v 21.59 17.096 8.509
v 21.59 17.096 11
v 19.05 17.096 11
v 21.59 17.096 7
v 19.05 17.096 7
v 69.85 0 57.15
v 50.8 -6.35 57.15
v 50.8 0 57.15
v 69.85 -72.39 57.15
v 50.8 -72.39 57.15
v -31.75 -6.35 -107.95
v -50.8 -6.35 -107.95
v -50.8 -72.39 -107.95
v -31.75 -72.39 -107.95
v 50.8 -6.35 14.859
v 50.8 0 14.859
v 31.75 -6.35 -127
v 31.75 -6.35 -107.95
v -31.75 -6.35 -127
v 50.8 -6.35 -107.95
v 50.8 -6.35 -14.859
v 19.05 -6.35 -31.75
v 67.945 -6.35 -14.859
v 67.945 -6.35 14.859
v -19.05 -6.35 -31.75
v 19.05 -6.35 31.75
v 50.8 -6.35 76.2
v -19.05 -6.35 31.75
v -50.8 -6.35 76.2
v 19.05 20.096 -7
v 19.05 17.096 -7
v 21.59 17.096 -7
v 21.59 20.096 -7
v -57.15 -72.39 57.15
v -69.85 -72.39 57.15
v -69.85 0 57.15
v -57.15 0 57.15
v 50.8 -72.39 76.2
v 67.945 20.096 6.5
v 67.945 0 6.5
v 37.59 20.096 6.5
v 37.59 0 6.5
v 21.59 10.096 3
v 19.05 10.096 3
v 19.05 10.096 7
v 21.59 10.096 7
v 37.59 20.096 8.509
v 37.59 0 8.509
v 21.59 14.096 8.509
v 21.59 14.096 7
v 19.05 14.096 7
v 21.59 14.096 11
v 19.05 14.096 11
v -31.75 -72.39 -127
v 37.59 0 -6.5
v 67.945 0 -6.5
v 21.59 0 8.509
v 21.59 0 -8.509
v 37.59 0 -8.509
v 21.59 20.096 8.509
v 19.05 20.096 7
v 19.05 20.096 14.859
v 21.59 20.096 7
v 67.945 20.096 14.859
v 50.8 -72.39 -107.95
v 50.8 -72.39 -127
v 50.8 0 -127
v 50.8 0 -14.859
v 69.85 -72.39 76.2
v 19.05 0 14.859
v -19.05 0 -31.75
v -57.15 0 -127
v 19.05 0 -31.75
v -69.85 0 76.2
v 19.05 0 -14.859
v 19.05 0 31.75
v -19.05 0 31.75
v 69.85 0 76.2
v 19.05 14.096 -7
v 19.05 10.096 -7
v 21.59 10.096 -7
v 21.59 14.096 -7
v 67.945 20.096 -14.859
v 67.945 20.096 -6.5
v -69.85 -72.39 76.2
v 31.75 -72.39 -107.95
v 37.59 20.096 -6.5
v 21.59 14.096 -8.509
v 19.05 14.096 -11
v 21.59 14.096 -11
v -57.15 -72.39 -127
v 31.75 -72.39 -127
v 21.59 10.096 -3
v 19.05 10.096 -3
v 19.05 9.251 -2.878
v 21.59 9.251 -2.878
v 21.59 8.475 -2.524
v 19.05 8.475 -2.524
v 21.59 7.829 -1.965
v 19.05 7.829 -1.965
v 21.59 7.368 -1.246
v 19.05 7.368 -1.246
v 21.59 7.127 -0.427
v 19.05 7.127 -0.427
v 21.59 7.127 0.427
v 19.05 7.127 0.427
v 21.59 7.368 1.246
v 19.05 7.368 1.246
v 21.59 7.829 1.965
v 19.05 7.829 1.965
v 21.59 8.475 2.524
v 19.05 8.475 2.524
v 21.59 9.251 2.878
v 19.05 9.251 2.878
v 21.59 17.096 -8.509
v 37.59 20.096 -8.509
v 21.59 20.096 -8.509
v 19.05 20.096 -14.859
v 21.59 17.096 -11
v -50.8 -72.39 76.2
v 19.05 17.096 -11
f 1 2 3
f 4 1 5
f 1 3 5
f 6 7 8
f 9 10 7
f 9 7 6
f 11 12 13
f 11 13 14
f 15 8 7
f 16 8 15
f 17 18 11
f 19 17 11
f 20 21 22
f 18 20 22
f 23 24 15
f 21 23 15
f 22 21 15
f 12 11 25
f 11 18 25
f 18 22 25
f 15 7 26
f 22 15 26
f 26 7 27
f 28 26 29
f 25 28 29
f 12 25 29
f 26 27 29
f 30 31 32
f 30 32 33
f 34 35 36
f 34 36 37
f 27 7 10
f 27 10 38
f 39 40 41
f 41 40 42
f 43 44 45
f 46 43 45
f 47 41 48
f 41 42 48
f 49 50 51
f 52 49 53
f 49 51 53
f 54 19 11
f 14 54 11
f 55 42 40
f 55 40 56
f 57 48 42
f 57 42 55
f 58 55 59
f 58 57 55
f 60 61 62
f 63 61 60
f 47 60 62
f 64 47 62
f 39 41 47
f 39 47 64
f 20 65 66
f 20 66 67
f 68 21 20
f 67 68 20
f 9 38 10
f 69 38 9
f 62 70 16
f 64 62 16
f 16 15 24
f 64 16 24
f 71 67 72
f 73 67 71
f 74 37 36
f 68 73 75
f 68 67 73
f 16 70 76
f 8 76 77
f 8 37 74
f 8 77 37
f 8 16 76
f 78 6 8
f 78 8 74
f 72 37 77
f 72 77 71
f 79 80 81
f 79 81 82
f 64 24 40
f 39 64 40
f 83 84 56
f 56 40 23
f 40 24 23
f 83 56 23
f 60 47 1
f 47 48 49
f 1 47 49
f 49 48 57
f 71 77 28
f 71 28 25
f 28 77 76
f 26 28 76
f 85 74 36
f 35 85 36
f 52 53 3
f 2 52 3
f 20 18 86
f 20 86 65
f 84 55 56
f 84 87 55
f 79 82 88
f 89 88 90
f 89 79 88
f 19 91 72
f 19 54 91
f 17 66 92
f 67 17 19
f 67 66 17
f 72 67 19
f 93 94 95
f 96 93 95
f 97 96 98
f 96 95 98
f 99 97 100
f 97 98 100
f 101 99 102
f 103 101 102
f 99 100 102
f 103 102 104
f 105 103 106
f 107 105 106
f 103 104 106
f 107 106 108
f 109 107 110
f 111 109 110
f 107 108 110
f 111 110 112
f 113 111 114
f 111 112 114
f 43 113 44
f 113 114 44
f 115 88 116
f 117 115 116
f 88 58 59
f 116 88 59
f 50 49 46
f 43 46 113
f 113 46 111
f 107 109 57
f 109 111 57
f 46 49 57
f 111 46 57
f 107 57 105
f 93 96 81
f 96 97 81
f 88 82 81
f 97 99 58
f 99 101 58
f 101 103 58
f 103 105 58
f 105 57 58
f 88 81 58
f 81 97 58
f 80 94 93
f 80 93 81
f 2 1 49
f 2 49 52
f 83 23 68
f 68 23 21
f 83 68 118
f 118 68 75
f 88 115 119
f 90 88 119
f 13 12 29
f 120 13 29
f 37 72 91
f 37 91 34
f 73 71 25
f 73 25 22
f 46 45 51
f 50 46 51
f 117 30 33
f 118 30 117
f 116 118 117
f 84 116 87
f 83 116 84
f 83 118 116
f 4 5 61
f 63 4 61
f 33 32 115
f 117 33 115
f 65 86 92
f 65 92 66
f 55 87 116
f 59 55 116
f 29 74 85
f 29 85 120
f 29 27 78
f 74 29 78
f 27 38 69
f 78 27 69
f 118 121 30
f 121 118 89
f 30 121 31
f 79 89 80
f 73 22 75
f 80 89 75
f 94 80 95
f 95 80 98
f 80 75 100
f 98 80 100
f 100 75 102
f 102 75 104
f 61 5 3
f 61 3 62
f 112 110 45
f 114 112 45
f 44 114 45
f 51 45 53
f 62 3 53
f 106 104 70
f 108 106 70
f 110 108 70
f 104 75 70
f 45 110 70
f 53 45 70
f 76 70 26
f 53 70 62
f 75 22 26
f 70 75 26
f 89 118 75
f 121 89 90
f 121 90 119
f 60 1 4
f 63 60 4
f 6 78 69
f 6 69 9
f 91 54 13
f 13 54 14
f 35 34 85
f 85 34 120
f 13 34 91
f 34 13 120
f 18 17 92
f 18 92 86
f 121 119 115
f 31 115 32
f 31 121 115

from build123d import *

# Parameters (mm, degrees)
SKETCH1_W                = 101.6
SKETCH1_H                = 152.4
BOSS_EXTRUDE1_DEPTH      = 6.35
SKETCH2_W                = 38.1
SKETCH2_H                = 63.5
CUT_EXTRUDE1_DEPTH       = 92.800885072
BOSS_EXTRUDE3_DEPTH      = 10.0965
BOSS_EXTRUDE3_DEPTH_BACK = 6.35
CUT_EXTRUDE2_REACH       = 105.862
SKETCH6_R                = 3
SKETCH7_W                = 24.005
SKETCH7_H                = 2.009
BOSS_EXTRUDE4_DEPTH      = 16.4465
BOSS_EXTRUDE5_REACH      = 129.401
SKETCH10_W               = 13
SKETCH10_H               = 6.35
CUT_EXTRUDE3_REACH       = 138.165
SKETCH11_W               = 13
SKETCH11_H               = 10.0965
BOSS_EXTRUDE6_DEPTH      = 10
CUT_EXTRUDE4_DEPTH       = 2.54
SKETCH14_W               = 101.6
SKETCH14_H               = 6.35
BOSS_EXTRUDE7_DEPTH      = 50.8
SKETCH15_W               = 19.05
SKETCH15_H               = 19.05
BOSS_EXTRUDE8_DEPTH      = 66.04
SKETCH16_W               = 19.05
SKETCH16_H               = 19.05
BOSS_EXTRUDE9_DEPTH      = 6.35
SKETCH17_W               = 184.15
SKETCH17_H               = 72.39
BOSS_EXTRUDE10_DEPTH     = 6.35


with BuildPart() as part:
    # Sketch1 → Boss-Extrude1 (new body)
    with BuildSketch(Plane(origin=(0, 0, 0), x_dir=(1, 0, 0), z_dir=(0, 1, 0))):
        Rectangle(SKETCH1_W, SKETCH1_H)
    extrude(amount=-BOSS_EXTRUDE1_DEPTH)

    # Sketch2 → Cut-Extrude1 (cut, through all)
    with BuildSketch(Plane(origin=(0, 0, 0), x_dir=(1, 0, 0), z_dir=(0, 1, 0))):
        Rectangle(SKETCH2_W, SKETCH2_H)
    extrude(amount=-CUT_EXTRUDE1_DEPTH, mode=Mode.SUBTRACT)

    # Sketch4 → Boss-Extrude3 (add, two sides: drawn at the far end of the back side and taken through both)
    with BuildSketch(Plane(origin=(0, 0, 0), x_dir=(1, 0, 0), z_dir=(0, 1, 0)).offset(-BOSS_EXTRUDE3_DEPTH_BACK)):
        Polygon((61.595, -8.509), (50.8, -8.509), (50.8, -14.859), (67.945, -14.859), (67.945, 14.859), (50.8, 14.859), (50.8, 8.509), (61.595, 8.509), align=None)
        Polygon((50.8, -8.509), (21.59, -8.509), (21.59, 8.509), (50.8, 8.509), (50.8, 14.859), (19.05, 14.859), (19.05, -14.859), (50.8, -14.859), align=None)
    extrude(amount=BOSS_EXTRUDE3_DEPTH + BOSS_EXTRUDE3_DEPTH_BACK)

    # Sketch6 → Cut-Extrude2 (cut, up to next)
    with BuildSketch(Plane.ZY.offset(-19.05), mode=Mode.PRIVATE) as cut_extrude2_sk1:
        with Locations((0, 10.0965)):
            Circle(SKETCH6_R)
    cut_extrude2_tool1 = extrude(cut_extrude2_sk1.sketch, amount=-CUT_EXTRUDE2_REACH, mode=Mode.PRIVATE) & part.part
    add(cut_extrude2_tool1.solids().sort_by_distance((19.05, 10.0965, 0))[0], mode=Mode.SUBTRACT)

    # Sketch7 → Boss-Extrude4 (add, through all)
    with BuildSketch(Plane(origin=(0, 10.0965, 0), x_dir=(1, 0, 0), z_dir=(0, 1, 0))):
        with Locations((49.5925, 7.5045)):
            Rectangle(SKETCH7_W, SKETCH7_H)
        with Locations((49.5925, -7.5045)):
            Rectangle(SKETCH7_W, SKETCH7_H)
    extrude(amount=-BOSS_EXTRUDE4_DEPTH)

    # Sketch10 → Boss-Extrude5 (add, up to next)
    with BuildSketch(Plane(origin=(50.8, 0, 0), x_dir=(0, 0, -1), z_dir=(1, 0, 0)), mode=Mode.PRIVATE) as boss_extrude5_sk1:
        with Locations((0, -3.175)):
            Rectangle(SKETCH10_W, SKETCH10_H)
    boss_extrude5_tool1 = extrude(boss_extrude5_sk1.sketch, amount=BOSS_EXTRUDE5_REACH, mode=Mode.PRIVATE) - part.part
    add(boss_extrude5_tool1.solids().sort_by_distance((50.8, -3.175, 0))[0])

    # Sketch11 → Cut-Extrude3 (cut, up to next)
    with BuildSketch(Plane.ZY.offset(-61.595), mode=Mode.PRIVATE) as cut_extrude3_sk1:
        with Locations((0, 5.04825)):
            Rectangle(SKETCH11_W, SKETCH11_H)
    cut_extrude3_tool1 = extrude(cut_extrude3_sk1.sketch, amount=-CUT_EXTRUDE3_REACH, mode=Mode.PRIVATE) & part.part
    add(cut_extrude3_tool1.solids().sort_by_distance((61.595, 5.04825, 0))[0], mode=Mode.SUBTRACT)

    # Sketch12 → Boss-Extrude6 (add)
    with BuildSketch(Plane(origin=(0, 10.0965, 0), x_dir=(1, 0, 0), z_dir=(0, 1, 0))):
        Polygon((67.945, -14.859), (67.945, -6.5), (37.59, -6.5), (37.59, -8.509), (21.59, -8.509), (21.59, -3), (19.05, -3), (19.05, -14.859), align=None)
        Polygon((37.59, 6.5), (67.945, 6.5), (67.945, 14.859), (19.05, 14.859), (19.05, 3), (21.59, 3), (21.59, 8.509), (37.59, 8.509), align=None)
    extrude(amount=BOSS_EXTRUDE6_DEPTH)

    # Sketch13 → Cut-Extrude4 (cut)
    with BuildSketch(Plane.ZY.offset(-19.05)):
        Polygon((3, 10.0965), (7, 10.0965), (7, 14.0965), (11, 14.0965), (11, 17.0965), (7, 17.0965), (7, 20.0965), (3, 20.0965), align=None)
    cut_extrude4 = extrude(amount=-CUT_EXTRUDE4_DEPTH, mode=Mode.SUBTRACT)

    # Mirror1: Cut-Extrude4 across plane
    add(cut_extrude4.mirror(Plane.XY), mode=Mode.SUBTRACT)

    # Sketch14 → Boss-Extrude7 (add)
    with BuildSketch(Plane(origin=(0, 0, -76.2), x_dir=(-1, 0, 0), z_dir=(0, 0, -1))):
        with Locations((0, -3.175)):
            Rectangle(SKETCH14_W, SKETCH14_H)
    extrude(amount=BOSS_EXTRUDE7_DEPTH)

    # Sketch15 → Boss-Extrude8 (add)
    with BuildSketch(Plane.XZ.offset(6.35)):
        with Locations((-60.325, 66.675)):
            Rectangle(SKETCH15_W, SKETCH15_H)
        with Locations((60.325, 66.675)):
            Rectangle(SKETCH15_W, SKETCH15_H)
        with Locations((-41.275, -117.475)):
            Rectangle(SKETCH15_W, SKETCH15_H)
        with Locations((41.275, -117.475)):
            Rectangle(SKETCH15_W, SKETCH15_H)
    extrude(amount=BOSS_EXTRUDE8_DEPTH)


with BuildPart() as boss_extrude8_piece_1:
    # of the separate pieces the step leaves, piece 1, a body of its own (boss_extrude8_pieces)
    add(part.part.solids().sort_by_distance((-50.8, 0, 76.2))[0])



with BuildPart() as boss_extrude8_piece_2:
    # of the separate pieces the step leaves, piece 2, a body of its own (boss_extrude8_pieces)
    add(part.part.solids().sort_by_distance((-50.8, -72.39, 76.2))[0])


with BuildPart() as boss_extrude8_piece_3:
    # of the separate pieces the step leaves, piece 3, a body of its own (boss_extrude8_pieces)
    add(part.part.solids().sort_by_distance((50.8, -72.39, 76.2))[0])


with BuildPart() as boss_extrude8_piece_1_1:
    add(boss_extrude8_piece_1.part)

    add(boss_extrude8_piece_2.part)  # Boss-Extrude9 merges Boss-Extrude8 piece 2

    add(boss_extrude8_piece_3.part)  # Boss-Extrude9 merges Boss-Extrude8 piece 3
    # Sketch16 → Boss-Extrude9 (add)
    with BuildSketch(Plane(origin=(0, -6.35, 0), x_dir=(1, 0, 0), z_dir=(0, 1, 0))):
        with Locations((60.325, -66.675)):
            Rectangle(SKETCH16_W, SKETCH16_H)
        with Locations((-60.325, -66.675)):
            Rectangle(SKETCH16_W, SKETCH16_H)
    extrude(amount=BOSS_EXTRUDE9_DEPTH)

    # Sketch17 → Boss-Extrude10 (add)
    with BuildSketch(Plane.ZY.offset(50.8)):
        with Locations((-34.925, -36.195)):
            Rectangle(SKETCH17_W, SKETCH17_H)
    extrude(amount=BOSS_EXTRUDE10_DEPTH)


solid = boss_extrude8_piece_1_1.part
